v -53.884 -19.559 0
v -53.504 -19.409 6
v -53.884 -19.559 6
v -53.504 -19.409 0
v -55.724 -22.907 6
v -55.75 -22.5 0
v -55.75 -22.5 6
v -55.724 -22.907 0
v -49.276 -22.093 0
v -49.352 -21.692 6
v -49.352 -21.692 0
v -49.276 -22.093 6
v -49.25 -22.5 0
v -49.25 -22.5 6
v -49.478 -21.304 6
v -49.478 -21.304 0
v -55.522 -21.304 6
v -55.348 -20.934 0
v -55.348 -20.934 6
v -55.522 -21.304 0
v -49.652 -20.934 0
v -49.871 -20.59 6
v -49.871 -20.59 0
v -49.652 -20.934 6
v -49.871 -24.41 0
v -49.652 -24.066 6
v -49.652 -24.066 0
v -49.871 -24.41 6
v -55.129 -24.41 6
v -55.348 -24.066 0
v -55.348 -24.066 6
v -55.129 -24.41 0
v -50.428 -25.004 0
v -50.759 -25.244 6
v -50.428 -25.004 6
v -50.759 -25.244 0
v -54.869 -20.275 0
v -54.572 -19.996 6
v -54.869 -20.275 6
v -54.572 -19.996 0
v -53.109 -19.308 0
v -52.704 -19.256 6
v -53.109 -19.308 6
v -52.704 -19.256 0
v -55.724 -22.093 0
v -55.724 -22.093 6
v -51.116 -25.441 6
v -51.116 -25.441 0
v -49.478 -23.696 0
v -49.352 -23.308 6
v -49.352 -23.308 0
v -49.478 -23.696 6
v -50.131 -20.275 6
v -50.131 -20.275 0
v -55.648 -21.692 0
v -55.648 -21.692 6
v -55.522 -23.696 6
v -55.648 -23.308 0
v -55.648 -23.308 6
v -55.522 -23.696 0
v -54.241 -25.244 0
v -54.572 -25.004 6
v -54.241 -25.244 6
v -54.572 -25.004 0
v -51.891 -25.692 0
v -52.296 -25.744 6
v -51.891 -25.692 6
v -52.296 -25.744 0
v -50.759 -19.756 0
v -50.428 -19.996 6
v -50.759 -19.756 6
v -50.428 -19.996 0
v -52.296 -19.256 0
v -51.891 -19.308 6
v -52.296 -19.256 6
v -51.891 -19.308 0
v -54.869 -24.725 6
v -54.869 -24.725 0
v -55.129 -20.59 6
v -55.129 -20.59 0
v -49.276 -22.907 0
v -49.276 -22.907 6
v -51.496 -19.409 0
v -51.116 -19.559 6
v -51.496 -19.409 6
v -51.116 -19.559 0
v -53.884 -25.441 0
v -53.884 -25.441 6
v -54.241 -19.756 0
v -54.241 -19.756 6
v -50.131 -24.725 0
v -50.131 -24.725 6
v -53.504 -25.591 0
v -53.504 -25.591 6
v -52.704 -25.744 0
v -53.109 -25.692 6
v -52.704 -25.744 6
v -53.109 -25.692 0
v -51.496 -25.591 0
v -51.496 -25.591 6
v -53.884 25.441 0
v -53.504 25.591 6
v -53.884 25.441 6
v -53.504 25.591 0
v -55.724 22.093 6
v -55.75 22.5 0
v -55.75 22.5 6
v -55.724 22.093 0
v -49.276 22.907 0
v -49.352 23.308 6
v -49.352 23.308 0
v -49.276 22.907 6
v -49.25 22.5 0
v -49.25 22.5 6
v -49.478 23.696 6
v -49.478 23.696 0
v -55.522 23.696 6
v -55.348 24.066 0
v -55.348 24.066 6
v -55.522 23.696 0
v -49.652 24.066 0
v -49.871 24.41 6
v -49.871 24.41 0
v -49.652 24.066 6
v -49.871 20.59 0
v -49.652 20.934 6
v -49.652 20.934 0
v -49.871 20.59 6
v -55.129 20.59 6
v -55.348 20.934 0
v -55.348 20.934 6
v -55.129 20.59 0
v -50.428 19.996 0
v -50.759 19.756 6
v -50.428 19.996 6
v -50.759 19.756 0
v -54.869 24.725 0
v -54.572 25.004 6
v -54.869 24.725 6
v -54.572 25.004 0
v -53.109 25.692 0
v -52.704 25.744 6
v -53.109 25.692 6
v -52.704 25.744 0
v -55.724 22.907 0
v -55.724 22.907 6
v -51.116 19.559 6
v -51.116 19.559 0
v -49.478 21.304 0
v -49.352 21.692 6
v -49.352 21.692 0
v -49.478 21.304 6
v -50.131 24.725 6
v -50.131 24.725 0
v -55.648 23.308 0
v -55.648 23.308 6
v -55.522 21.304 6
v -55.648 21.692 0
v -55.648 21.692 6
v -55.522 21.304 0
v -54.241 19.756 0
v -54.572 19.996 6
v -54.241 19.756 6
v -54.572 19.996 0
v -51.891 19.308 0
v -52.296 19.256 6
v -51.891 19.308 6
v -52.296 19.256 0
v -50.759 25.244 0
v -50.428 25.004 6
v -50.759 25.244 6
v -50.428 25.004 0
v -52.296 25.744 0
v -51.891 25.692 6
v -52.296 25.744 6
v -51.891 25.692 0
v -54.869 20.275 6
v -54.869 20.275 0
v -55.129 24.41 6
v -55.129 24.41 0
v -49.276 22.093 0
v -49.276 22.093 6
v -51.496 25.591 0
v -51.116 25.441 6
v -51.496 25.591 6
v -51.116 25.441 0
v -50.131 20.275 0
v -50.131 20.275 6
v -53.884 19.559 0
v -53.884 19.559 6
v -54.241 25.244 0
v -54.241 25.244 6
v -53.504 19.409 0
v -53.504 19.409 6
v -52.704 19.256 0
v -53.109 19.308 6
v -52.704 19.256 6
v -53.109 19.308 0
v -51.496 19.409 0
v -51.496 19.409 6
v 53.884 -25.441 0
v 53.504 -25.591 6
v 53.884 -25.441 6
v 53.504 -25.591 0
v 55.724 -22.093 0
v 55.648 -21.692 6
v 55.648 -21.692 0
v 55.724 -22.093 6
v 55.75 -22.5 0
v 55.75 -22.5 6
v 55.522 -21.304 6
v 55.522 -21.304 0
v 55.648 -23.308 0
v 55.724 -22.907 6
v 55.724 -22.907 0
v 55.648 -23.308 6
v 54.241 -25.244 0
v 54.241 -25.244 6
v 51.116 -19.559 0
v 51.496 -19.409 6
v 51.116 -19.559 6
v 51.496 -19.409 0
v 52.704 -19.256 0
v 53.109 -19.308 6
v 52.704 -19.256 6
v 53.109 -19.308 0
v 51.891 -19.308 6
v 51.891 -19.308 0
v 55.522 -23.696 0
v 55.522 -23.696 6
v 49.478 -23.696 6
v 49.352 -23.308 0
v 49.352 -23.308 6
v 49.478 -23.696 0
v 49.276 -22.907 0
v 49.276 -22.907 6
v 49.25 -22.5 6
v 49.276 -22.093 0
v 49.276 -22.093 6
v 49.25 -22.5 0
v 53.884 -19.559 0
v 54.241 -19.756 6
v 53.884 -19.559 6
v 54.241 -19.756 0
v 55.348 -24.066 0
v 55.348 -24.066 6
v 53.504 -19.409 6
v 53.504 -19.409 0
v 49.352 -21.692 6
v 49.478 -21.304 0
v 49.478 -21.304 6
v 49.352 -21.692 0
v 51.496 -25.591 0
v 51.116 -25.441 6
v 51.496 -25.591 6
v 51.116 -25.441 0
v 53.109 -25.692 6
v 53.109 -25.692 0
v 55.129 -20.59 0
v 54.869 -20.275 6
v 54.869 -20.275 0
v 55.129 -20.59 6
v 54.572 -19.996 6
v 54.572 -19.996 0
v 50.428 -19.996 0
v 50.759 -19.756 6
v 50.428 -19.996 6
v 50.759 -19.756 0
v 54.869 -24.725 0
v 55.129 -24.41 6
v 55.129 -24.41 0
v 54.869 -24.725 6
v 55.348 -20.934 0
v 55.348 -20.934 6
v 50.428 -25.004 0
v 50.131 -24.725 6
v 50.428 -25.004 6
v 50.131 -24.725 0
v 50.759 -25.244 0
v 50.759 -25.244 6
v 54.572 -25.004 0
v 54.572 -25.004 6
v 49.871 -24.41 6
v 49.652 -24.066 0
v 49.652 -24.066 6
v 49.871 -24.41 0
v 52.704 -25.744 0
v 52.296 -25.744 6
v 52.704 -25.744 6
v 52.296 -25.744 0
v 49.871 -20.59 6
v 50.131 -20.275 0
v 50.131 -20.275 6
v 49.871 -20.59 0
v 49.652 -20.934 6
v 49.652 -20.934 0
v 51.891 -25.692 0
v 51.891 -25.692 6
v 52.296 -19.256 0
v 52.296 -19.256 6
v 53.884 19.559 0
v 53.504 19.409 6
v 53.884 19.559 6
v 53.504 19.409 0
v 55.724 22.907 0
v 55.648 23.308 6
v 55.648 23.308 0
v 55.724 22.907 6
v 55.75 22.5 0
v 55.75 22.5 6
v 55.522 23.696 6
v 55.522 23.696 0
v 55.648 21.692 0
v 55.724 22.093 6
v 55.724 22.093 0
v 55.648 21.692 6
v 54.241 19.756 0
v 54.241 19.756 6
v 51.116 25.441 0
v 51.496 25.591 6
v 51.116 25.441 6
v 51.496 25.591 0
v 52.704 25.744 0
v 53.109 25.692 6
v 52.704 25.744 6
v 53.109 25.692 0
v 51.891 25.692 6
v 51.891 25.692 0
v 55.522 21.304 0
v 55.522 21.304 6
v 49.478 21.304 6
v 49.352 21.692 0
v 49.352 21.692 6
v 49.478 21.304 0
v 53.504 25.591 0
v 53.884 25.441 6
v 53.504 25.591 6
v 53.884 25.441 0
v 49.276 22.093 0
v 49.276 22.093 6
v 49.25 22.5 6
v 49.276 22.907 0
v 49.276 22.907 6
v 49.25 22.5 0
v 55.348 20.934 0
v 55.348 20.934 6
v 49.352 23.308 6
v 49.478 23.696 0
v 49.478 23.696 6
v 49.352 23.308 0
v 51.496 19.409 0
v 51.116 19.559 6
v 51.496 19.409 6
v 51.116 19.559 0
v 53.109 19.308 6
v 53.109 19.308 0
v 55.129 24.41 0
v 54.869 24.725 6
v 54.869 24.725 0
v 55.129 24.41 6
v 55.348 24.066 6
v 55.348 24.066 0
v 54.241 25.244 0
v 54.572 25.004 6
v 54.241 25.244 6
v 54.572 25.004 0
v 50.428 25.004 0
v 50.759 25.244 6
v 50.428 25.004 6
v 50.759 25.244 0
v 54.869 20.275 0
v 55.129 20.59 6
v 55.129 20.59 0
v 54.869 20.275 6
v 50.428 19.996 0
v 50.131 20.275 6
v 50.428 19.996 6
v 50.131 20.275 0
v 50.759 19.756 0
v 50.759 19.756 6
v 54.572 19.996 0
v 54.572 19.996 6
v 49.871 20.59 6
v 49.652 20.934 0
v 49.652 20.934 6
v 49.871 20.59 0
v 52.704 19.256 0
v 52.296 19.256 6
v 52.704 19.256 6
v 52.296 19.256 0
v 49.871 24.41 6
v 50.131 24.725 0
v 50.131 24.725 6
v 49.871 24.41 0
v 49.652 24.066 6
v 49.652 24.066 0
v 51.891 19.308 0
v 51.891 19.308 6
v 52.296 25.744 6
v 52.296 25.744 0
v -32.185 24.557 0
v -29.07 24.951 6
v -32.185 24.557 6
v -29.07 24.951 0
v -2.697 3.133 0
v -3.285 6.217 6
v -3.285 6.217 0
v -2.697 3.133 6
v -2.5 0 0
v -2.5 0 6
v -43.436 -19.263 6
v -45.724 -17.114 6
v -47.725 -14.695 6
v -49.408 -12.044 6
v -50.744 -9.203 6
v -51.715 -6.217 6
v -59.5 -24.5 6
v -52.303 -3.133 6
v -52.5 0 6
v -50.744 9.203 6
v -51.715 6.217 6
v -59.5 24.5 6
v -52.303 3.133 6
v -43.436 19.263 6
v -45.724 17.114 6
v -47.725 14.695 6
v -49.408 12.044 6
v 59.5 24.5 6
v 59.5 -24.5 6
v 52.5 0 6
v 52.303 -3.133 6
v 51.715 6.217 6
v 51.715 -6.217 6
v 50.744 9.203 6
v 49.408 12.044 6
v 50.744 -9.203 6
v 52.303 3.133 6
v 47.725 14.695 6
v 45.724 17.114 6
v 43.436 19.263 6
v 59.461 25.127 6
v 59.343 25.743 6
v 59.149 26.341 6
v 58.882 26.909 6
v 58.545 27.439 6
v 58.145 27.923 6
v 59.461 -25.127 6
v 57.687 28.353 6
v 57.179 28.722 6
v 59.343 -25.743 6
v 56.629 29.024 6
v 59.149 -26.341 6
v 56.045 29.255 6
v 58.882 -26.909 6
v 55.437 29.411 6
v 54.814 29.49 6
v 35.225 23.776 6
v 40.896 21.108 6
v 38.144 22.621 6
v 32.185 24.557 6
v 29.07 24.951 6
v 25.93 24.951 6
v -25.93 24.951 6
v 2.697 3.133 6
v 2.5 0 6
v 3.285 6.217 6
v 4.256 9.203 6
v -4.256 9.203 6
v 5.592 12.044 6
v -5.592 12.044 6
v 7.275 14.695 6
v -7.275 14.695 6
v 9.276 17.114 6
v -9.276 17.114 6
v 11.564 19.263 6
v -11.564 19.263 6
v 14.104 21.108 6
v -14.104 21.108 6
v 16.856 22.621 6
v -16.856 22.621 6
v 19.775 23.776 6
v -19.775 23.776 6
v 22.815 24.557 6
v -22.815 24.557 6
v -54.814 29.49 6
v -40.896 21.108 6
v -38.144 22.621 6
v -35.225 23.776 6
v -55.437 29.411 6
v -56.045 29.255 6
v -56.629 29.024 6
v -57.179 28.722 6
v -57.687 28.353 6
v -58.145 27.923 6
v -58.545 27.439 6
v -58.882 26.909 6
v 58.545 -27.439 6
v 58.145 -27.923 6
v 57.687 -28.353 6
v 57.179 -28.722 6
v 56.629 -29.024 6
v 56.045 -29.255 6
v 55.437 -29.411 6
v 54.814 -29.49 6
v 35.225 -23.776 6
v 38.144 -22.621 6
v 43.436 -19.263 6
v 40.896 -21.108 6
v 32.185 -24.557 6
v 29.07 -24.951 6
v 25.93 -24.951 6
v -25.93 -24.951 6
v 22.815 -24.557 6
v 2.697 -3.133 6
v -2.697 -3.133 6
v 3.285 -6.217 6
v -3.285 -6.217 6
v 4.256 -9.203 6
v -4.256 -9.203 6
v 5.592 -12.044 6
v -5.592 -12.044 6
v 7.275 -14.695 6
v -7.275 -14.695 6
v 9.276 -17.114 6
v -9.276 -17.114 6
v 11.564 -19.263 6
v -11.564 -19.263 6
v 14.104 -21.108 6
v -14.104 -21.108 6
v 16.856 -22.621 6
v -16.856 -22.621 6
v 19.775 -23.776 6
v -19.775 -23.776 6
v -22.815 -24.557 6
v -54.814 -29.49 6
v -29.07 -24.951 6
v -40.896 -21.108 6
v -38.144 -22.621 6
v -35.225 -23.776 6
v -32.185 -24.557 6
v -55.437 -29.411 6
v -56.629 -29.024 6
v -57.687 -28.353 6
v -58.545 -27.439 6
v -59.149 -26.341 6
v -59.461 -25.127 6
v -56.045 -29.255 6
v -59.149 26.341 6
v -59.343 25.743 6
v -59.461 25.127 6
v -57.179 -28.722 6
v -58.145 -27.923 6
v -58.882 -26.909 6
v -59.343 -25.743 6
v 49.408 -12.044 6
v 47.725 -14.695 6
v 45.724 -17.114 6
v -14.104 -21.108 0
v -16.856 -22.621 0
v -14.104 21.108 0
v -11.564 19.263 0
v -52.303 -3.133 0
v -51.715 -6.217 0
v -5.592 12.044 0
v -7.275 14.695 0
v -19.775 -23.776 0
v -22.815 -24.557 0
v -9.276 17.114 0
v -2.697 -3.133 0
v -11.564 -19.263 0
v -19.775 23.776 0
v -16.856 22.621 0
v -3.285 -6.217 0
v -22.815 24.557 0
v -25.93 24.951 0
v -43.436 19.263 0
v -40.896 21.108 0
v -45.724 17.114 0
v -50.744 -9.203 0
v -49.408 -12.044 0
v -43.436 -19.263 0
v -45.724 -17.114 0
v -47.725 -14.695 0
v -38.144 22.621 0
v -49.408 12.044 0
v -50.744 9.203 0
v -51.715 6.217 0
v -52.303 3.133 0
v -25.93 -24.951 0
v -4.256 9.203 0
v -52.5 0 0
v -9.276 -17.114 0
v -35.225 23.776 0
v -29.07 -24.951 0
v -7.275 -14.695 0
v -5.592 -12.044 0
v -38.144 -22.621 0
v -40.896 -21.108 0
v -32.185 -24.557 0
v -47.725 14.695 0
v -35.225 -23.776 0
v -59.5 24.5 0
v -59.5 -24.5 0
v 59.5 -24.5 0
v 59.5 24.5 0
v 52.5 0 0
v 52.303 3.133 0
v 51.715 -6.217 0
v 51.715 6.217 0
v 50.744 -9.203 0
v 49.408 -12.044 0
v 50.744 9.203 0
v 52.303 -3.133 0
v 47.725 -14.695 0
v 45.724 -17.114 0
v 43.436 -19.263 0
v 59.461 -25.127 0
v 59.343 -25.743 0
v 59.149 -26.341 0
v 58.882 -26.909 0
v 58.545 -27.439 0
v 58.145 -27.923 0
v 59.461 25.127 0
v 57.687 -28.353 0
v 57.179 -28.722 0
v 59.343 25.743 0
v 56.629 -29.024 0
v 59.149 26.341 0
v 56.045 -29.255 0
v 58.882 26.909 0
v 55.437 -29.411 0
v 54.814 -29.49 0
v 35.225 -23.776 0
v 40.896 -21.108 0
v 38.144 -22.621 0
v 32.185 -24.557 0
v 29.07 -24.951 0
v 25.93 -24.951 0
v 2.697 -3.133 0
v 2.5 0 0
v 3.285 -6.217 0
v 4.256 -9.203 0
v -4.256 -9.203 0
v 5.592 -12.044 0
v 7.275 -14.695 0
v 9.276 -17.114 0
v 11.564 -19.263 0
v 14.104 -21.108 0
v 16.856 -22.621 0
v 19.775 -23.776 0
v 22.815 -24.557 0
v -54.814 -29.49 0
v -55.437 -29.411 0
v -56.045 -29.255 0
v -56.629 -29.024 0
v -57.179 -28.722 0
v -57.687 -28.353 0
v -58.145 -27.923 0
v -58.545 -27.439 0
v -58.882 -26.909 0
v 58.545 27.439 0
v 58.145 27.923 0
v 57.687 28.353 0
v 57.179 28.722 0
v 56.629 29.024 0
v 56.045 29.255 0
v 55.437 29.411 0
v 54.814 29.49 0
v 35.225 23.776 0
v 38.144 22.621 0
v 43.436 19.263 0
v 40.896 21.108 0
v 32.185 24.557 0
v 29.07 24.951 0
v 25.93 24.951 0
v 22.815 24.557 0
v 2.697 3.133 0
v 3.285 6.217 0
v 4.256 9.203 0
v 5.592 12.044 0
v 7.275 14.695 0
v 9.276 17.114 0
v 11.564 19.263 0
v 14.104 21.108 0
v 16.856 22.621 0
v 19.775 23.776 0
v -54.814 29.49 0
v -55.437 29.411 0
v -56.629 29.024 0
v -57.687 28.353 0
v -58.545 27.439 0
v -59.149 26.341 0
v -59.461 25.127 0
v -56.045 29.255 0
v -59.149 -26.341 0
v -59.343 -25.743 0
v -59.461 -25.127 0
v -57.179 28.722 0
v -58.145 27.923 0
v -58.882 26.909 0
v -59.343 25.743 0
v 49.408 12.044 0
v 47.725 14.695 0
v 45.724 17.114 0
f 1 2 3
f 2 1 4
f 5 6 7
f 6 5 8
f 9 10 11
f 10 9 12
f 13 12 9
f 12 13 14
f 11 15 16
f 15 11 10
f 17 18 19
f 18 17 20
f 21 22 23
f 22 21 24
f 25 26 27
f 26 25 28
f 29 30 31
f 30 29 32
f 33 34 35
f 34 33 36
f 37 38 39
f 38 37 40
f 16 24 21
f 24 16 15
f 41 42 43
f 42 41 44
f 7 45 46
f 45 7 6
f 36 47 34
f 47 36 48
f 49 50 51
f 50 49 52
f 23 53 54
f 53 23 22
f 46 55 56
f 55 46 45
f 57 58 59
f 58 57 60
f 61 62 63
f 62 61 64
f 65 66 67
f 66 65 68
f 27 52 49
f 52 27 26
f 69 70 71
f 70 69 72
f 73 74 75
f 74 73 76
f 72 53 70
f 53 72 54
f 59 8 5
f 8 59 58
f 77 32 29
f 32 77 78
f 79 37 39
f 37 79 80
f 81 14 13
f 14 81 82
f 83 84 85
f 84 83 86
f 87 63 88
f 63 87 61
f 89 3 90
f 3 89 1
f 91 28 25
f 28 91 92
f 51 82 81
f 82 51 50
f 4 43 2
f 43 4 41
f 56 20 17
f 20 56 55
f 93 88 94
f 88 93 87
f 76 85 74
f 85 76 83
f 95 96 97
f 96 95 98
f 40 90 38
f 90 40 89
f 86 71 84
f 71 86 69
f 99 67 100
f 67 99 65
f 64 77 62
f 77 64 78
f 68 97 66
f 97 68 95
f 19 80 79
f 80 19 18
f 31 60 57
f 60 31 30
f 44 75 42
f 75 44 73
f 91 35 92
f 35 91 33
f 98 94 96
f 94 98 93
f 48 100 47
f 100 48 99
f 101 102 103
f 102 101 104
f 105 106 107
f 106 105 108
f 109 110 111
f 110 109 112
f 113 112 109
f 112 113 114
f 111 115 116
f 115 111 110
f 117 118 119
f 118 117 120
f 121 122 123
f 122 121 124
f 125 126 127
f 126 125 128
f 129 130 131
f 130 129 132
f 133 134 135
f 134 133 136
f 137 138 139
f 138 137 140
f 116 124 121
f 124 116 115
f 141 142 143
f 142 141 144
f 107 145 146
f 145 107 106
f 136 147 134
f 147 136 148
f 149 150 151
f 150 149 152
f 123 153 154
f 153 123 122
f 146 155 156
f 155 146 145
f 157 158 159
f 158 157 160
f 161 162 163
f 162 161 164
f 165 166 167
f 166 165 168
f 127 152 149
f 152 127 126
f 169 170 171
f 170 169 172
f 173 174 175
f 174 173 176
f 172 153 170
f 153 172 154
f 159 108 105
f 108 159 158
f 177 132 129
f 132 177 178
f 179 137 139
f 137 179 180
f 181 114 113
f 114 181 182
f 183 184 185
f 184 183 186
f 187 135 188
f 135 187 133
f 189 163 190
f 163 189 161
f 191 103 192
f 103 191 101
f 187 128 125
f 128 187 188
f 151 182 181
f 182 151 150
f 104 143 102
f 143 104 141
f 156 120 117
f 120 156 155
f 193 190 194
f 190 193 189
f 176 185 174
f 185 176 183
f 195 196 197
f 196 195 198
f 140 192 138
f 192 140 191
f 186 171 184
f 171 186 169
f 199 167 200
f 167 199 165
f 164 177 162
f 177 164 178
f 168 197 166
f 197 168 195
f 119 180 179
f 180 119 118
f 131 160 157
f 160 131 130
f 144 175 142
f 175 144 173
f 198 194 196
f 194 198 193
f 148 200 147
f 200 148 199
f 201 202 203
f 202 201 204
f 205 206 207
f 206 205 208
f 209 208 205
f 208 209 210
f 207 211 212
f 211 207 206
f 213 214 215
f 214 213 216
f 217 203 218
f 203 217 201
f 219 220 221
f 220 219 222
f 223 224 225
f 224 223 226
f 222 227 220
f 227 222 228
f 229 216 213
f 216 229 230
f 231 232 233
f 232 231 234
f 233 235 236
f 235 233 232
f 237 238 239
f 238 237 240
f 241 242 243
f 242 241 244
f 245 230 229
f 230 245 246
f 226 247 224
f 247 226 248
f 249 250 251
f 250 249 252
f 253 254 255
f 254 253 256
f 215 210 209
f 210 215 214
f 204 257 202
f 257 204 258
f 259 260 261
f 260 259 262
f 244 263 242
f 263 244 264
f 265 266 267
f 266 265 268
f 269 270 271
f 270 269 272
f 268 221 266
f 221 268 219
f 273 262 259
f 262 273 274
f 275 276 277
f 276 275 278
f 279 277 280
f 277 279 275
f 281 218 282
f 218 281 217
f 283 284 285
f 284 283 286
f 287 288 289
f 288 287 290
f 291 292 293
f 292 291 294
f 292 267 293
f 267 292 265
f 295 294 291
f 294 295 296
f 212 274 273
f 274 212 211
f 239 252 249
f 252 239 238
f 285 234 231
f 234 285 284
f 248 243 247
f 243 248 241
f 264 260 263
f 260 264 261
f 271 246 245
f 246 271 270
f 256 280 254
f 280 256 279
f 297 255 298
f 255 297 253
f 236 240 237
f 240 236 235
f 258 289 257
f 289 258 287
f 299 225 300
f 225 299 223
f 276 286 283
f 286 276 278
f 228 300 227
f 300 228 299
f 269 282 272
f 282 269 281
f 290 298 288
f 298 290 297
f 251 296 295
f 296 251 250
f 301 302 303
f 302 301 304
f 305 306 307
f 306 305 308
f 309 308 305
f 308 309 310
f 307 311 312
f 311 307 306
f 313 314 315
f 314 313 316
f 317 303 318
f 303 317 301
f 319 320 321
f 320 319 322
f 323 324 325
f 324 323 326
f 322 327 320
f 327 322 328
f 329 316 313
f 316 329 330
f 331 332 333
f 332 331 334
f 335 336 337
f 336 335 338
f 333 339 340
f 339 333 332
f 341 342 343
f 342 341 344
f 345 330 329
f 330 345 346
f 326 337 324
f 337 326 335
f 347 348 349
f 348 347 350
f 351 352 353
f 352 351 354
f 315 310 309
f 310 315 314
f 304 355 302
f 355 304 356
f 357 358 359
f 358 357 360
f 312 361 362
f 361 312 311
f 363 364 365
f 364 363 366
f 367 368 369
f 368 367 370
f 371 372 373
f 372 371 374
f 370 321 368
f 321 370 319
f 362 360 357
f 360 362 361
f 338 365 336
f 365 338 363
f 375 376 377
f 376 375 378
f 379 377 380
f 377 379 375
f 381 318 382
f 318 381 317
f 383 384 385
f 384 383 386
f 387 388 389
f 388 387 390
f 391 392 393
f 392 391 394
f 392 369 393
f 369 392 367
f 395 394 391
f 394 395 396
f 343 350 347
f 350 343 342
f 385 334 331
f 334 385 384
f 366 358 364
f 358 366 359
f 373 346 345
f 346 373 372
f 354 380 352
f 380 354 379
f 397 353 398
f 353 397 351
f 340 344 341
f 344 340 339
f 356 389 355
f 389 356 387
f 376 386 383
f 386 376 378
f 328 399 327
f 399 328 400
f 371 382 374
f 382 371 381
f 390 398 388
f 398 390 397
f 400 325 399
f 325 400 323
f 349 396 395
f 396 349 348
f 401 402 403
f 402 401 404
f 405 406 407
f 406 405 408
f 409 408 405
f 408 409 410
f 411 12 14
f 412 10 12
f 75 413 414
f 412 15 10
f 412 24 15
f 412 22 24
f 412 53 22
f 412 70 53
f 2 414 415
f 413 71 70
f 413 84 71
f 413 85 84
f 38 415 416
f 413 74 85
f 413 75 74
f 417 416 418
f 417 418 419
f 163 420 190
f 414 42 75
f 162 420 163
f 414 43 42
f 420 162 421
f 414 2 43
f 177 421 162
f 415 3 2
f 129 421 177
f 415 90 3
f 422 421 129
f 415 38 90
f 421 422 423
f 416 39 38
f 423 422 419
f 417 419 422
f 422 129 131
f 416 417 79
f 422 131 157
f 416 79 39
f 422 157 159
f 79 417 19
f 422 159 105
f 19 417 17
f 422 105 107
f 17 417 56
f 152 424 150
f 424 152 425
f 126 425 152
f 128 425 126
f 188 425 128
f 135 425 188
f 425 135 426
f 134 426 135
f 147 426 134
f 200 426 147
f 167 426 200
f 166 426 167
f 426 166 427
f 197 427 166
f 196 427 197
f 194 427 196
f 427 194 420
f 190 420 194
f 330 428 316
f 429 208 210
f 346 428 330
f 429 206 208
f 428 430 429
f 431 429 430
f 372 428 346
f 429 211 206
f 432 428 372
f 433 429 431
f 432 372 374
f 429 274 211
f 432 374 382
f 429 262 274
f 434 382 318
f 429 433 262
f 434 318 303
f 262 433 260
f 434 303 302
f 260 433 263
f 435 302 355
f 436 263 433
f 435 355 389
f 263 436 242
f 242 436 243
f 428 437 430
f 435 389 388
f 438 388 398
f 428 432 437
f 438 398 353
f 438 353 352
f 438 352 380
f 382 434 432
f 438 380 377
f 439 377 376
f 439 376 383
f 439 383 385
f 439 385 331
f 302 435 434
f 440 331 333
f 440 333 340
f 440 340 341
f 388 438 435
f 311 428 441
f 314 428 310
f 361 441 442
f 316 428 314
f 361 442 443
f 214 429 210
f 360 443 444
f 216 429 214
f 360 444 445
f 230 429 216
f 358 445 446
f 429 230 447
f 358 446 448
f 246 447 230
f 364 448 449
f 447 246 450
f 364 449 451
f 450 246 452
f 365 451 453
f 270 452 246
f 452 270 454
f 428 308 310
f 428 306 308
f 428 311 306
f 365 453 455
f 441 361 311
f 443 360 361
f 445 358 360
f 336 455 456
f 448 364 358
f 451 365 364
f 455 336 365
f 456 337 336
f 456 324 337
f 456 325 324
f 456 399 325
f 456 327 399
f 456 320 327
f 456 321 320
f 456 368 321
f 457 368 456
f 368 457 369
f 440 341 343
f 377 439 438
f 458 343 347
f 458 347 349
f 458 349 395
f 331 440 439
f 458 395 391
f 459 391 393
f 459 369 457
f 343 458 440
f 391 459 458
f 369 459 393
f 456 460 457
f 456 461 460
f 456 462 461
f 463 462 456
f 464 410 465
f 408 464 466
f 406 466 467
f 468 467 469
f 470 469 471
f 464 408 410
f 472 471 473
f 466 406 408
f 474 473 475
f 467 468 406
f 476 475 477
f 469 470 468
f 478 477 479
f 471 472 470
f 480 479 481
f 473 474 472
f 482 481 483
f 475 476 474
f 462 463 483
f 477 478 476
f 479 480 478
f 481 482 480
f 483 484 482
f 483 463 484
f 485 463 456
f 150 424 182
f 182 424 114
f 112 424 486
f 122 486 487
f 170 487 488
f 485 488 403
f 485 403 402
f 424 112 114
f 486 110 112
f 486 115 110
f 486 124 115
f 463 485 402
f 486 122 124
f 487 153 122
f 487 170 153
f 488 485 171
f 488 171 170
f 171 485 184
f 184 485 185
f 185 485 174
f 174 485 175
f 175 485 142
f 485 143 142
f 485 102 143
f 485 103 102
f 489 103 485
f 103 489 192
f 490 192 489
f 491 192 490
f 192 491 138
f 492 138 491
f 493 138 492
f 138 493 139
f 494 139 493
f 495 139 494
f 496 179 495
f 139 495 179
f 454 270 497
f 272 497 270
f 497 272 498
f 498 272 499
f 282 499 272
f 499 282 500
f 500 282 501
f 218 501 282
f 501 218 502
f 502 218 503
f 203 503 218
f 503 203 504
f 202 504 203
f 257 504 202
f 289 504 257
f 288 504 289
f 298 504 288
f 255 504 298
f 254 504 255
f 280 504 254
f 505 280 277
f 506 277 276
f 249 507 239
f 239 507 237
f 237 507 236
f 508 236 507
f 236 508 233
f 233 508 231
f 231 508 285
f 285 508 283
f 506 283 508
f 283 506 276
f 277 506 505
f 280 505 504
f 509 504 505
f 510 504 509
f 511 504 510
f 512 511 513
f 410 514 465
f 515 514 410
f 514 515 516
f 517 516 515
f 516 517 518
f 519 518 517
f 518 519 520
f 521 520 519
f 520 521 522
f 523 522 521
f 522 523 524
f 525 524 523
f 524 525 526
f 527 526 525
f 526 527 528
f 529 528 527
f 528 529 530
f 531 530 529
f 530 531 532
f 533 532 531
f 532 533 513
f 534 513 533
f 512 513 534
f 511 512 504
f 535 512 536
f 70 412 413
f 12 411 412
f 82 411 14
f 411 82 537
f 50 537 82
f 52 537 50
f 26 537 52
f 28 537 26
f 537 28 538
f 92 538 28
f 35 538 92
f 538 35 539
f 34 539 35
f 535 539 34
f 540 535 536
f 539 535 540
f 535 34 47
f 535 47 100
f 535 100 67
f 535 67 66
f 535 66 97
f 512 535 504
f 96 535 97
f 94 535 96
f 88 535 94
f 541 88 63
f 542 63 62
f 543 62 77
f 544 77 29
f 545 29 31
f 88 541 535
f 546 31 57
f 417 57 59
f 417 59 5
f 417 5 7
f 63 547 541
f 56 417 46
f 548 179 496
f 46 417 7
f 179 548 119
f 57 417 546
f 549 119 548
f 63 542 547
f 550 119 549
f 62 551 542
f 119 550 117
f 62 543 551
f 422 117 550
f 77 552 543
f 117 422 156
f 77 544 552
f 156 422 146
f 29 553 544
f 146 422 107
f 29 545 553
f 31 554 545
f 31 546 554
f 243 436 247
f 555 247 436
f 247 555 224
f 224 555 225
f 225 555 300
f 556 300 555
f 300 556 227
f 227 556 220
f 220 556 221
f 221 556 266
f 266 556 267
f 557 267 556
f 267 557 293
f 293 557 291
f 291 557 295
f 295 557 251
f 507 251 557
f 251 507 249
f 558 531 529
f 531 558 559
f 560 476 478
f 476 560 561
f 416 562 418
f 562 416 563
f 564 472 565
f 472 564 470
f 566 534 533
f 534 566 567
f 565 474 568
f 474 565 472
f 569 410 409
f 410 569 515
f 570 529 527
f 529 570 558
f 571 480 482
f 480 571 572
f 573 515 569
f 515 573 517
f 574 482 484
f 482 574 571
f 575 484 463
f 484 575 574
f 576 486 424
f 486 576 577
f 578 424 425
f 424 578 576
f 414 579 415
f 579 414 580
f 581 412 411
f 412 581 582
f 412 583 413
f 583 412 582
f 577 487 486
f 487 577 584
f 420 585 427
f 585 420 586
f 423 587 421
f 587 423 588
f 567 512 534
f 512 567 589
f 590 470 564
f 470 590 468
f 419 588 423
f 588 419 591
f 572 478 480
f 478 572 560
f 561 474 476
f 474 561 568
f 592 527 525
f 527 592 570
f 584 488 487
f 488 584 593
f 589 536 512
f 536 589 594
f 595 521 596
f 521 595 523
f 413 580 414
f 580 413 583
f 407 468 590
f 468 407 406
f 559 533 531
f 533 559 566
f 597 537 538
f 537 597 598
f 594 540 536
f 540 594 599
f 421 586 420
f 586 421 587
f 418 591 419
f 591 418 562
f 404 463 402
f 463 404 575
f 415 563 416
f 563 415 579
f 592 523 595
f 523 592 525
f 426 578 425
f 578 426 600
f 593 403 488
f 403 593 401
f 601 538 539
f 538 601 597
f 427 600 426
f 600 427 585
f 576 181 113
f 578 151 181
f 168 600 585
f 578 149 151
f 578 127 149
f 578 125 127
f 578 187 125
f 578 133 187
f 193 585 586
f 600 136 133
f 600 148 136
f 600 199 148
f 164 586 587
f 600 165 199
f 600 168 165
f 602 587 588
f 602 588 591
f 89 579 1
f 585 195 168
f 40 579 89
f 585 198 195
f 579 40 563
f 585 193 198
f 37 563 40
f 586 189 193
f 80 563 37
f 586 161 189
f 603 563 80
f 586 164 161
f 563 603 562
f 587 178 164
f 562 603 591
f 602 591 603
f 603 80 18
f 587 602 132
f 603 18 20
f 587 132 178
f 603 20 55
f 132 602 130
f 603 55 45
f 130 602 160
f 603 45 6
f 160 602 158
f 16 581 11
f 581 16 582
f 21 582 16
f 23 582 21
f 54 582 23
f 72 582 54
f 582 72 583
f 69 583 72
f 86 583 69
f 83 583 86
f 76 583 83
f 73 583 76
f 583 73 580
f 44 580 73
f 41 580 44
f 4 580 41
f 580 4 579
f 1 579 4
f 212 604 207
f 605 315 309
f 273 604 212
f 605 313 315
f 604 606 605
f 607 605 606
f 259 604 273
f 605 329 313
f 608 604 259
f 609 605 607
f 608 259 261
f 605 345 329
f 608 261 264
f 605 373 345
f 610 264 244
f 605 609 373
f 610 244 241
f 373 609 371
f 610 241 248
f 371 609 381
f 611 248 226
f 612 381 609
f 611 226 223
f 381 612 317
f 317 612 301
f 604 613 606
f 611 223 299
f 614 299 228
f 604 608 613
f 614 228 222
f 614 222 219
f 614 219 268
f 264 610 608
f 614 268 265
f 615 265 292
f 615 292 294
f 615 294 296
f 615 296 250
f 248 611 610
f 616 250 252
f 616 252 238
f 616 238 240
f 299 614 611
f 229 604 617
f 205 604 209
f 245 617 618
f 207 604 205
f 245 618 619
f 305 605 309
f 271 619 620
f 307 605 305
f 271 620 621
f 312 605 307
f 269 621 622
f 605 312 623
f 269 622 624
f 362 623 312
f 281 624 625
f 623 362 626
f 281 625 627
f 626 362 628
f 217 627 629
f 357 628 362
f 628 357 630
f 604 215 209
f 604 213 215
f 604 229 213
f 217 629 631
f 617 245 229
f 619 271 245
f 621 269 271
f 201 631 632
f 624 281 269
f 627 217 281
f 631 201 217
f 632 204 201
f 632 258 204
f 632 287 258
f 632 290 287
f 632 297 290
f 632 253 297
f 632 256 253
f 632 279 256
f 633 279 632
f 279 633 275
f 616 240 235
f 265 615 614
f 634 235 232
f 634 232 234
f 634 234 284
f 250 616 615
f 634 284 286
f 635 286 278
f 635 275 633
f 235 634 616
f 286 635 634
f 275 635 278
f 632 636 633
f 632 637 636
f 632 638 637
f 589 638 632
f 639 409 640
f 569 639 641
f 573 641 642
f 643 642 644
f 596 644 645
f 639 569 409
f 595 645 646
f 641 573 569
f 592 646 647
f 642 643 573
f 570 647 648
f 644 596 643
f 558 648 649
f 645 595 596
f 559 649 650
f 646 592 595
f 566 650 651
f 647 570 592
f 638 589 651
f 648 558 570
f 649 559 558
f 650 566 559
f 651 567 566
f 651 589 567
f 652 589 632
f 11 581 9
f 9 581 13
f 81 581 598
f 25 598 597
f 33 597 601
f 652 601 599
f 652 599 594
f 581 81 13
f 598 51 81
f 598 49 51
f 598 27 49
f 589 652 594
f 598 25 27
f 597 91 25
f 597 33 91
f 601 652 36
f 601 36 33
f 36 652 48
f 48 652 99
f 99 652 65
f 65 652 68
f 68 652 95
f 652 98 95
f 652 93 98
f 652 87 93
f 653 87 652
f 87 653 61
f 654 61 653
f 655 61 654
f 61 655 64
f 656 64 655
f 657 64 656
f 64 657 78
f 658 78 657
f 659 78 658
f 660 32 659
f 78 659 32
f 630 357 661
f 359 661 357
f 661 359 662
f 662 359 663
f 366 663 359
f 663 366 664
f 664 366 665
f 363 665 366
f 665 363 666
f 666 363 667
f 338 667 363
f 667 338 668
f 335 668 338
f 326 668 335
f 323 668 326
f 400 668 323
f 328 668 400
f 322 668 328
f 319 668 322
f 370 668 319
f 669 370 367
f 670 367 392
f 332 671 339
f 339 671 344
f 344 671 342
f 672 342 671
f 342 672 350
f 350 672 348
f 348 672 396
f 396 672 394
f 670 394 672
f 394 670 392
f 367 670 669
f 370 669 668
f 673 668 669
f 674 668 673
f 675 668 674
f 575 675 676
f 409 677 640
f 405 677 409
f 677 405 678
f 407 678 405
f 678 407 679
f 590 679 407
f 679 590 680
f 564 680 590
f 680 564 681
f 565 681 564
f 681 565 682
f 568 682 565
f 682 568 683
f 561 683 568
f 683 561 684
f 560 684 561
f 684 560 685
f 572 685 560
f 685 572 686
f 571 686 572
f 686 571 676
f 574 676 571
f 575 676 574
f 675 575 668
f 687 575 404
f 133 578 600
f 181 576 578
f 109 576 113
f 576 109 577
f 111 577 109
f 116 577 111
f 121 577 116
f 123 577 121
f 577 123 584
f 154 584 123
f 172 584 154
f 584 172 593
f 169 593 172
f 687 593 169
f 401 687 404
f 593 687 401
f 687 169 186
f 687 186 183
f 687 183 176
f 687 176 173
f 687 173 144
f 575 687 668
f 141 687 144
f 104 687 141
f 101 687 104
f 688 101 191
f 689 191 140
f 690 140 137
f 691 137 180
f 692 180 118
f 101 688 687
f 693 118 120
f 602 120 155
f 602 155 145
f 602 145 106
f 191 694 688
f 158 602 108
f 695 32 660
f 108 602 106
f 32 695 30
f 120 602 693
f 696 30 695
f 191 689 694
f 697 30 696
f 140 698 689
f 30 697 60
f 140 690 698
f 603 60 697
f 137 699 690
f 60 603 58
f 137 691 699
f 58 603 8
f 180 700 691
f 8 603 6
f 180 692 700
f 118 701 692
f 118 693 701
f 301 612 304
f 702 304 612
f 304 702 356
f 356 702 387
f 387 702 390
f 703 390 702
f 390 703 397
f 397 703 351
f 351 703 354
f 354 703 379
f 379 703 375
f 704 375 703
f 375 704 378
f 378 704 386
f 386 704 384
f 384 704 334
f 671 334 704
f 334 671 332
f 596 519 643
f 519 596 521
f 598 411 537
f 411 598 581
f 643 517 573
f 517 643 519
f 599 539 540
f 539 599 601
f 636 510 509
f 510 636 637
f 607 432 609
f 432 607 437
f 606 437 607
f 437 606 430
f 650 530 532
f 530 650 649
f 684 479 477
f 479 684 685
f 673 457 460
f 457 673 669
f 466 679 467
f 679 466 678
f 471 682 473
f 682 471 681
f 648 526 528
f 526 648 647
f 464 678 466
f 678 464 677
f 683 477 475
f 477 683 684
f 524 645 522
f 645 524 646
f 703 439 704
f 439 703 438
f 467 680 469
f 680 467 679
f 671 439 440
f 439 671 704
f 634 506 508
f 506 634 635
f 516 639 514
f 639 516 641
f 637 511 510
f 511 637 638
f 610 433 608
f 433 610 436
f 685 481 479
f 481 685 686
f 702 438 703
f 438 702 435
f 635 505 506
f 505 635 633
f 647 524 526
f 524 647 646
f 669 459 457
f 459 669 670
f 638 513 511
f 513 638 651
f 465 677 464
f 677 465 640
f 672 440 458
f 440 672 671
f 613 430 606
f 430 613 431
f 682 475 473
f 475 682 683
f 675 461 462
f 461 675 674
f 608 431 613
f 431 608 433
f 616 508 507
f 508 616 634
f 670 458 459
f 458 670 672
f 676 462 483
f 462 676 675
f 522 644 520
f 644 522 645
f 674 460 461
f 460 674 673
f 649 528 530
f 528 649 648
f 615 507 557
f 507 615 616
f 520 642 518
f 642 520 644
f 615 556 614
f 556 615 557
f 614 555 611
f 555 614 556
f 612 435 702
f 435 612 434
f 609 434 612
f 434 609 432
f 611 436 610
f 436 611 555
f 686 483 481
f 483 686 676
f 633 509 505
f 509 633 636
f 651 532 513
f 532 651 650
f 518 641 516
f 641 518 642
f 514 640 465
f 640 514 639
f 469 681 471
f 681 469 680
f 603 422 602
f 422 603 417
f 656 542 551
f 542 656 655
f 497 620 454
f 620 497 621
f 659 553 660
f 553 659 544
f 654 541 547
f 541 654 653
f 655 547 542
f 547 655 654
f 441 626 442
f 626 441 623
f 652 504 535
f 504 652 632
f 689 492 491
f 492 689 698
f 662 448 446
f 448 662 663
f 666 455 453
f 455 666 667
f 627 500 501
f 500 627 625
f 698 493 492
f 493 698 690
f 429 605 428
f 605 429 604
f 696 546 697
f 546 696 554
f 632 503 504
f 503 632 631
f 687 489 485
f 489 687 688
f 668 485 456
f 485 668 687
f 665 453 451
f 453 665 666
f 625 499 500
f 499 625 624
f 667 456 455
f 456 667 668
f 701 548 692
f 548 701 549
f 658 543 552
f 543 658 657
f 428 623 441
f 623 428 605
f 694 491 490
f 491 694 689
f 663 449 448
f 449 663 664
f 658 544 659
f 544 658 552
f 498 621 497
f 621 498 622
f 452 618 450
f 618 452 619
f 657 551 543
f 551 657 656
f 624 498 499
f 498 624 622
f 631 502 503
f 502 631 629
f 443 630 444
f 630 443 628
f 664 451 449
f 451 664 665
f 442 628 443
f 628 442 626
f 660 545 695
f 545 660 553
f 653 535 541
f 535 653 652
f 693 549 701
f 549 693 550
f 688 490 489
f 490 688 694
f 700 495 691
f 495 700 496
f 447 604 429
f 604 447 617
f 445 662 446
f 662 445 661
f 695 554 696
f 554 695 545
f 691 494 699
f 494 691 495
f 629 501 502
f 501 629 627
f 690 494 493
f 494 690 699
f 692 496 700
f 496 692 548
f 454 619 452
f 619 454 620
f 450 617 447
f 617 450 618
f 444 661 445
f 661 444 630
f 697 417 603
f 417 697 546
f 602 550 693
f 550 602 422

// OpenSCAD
$fn = 50;


difference() {
	union() {
		hull() {
			translate(v = [-54.5000000000, 24.5000000000, 0]) {
				cylinder(h = 6, r = 5);
			}
			translate(v = [54.5000000000, 24.5000000000, 0]) {
				cylinder(h = 6, r = 5);
			}
			translate(v = [-54.5000000000, -24.5000000000, 0]) {
				cylinder(h = 6, r = 5);
			}
			translate(v = [54.5000000000, -24.5000000000, 0]) {
				cylinder(h = 6, r = 5);
			}
		}
	}
	union() {
		#translate(v = [-52.5000000000, -22.5000000000, -100.0000000000]) {
			cylinder(h = 200, r = 3.2500000000);
		}
		#translate(v = [-52.5000000000, 22.5000000000, -100.0000000000]) {
			cylinder(h = 200, r = 3.2500000000);
		}
		#translate(v = [52.5000000000, -22.5000000000, -100.0000000000]) {
			cylinder(h = 200, r = 3.2500000000);
		}
		#translate(v = [52.5000000000, 22.5000000000, -100.0000000000]) {
			cylinder(h = 200, r = 3.2500000000);
		}
		#translate(v = [-27.5000000000, 0, 0]) {
			cylinder(h = 6, r = 25.0000000000);
		}
		#translate(v = [27.5000000000, 0, 0]) {
			cylinder(h = 6, r = 25.0000000000);
		}
	}
}
